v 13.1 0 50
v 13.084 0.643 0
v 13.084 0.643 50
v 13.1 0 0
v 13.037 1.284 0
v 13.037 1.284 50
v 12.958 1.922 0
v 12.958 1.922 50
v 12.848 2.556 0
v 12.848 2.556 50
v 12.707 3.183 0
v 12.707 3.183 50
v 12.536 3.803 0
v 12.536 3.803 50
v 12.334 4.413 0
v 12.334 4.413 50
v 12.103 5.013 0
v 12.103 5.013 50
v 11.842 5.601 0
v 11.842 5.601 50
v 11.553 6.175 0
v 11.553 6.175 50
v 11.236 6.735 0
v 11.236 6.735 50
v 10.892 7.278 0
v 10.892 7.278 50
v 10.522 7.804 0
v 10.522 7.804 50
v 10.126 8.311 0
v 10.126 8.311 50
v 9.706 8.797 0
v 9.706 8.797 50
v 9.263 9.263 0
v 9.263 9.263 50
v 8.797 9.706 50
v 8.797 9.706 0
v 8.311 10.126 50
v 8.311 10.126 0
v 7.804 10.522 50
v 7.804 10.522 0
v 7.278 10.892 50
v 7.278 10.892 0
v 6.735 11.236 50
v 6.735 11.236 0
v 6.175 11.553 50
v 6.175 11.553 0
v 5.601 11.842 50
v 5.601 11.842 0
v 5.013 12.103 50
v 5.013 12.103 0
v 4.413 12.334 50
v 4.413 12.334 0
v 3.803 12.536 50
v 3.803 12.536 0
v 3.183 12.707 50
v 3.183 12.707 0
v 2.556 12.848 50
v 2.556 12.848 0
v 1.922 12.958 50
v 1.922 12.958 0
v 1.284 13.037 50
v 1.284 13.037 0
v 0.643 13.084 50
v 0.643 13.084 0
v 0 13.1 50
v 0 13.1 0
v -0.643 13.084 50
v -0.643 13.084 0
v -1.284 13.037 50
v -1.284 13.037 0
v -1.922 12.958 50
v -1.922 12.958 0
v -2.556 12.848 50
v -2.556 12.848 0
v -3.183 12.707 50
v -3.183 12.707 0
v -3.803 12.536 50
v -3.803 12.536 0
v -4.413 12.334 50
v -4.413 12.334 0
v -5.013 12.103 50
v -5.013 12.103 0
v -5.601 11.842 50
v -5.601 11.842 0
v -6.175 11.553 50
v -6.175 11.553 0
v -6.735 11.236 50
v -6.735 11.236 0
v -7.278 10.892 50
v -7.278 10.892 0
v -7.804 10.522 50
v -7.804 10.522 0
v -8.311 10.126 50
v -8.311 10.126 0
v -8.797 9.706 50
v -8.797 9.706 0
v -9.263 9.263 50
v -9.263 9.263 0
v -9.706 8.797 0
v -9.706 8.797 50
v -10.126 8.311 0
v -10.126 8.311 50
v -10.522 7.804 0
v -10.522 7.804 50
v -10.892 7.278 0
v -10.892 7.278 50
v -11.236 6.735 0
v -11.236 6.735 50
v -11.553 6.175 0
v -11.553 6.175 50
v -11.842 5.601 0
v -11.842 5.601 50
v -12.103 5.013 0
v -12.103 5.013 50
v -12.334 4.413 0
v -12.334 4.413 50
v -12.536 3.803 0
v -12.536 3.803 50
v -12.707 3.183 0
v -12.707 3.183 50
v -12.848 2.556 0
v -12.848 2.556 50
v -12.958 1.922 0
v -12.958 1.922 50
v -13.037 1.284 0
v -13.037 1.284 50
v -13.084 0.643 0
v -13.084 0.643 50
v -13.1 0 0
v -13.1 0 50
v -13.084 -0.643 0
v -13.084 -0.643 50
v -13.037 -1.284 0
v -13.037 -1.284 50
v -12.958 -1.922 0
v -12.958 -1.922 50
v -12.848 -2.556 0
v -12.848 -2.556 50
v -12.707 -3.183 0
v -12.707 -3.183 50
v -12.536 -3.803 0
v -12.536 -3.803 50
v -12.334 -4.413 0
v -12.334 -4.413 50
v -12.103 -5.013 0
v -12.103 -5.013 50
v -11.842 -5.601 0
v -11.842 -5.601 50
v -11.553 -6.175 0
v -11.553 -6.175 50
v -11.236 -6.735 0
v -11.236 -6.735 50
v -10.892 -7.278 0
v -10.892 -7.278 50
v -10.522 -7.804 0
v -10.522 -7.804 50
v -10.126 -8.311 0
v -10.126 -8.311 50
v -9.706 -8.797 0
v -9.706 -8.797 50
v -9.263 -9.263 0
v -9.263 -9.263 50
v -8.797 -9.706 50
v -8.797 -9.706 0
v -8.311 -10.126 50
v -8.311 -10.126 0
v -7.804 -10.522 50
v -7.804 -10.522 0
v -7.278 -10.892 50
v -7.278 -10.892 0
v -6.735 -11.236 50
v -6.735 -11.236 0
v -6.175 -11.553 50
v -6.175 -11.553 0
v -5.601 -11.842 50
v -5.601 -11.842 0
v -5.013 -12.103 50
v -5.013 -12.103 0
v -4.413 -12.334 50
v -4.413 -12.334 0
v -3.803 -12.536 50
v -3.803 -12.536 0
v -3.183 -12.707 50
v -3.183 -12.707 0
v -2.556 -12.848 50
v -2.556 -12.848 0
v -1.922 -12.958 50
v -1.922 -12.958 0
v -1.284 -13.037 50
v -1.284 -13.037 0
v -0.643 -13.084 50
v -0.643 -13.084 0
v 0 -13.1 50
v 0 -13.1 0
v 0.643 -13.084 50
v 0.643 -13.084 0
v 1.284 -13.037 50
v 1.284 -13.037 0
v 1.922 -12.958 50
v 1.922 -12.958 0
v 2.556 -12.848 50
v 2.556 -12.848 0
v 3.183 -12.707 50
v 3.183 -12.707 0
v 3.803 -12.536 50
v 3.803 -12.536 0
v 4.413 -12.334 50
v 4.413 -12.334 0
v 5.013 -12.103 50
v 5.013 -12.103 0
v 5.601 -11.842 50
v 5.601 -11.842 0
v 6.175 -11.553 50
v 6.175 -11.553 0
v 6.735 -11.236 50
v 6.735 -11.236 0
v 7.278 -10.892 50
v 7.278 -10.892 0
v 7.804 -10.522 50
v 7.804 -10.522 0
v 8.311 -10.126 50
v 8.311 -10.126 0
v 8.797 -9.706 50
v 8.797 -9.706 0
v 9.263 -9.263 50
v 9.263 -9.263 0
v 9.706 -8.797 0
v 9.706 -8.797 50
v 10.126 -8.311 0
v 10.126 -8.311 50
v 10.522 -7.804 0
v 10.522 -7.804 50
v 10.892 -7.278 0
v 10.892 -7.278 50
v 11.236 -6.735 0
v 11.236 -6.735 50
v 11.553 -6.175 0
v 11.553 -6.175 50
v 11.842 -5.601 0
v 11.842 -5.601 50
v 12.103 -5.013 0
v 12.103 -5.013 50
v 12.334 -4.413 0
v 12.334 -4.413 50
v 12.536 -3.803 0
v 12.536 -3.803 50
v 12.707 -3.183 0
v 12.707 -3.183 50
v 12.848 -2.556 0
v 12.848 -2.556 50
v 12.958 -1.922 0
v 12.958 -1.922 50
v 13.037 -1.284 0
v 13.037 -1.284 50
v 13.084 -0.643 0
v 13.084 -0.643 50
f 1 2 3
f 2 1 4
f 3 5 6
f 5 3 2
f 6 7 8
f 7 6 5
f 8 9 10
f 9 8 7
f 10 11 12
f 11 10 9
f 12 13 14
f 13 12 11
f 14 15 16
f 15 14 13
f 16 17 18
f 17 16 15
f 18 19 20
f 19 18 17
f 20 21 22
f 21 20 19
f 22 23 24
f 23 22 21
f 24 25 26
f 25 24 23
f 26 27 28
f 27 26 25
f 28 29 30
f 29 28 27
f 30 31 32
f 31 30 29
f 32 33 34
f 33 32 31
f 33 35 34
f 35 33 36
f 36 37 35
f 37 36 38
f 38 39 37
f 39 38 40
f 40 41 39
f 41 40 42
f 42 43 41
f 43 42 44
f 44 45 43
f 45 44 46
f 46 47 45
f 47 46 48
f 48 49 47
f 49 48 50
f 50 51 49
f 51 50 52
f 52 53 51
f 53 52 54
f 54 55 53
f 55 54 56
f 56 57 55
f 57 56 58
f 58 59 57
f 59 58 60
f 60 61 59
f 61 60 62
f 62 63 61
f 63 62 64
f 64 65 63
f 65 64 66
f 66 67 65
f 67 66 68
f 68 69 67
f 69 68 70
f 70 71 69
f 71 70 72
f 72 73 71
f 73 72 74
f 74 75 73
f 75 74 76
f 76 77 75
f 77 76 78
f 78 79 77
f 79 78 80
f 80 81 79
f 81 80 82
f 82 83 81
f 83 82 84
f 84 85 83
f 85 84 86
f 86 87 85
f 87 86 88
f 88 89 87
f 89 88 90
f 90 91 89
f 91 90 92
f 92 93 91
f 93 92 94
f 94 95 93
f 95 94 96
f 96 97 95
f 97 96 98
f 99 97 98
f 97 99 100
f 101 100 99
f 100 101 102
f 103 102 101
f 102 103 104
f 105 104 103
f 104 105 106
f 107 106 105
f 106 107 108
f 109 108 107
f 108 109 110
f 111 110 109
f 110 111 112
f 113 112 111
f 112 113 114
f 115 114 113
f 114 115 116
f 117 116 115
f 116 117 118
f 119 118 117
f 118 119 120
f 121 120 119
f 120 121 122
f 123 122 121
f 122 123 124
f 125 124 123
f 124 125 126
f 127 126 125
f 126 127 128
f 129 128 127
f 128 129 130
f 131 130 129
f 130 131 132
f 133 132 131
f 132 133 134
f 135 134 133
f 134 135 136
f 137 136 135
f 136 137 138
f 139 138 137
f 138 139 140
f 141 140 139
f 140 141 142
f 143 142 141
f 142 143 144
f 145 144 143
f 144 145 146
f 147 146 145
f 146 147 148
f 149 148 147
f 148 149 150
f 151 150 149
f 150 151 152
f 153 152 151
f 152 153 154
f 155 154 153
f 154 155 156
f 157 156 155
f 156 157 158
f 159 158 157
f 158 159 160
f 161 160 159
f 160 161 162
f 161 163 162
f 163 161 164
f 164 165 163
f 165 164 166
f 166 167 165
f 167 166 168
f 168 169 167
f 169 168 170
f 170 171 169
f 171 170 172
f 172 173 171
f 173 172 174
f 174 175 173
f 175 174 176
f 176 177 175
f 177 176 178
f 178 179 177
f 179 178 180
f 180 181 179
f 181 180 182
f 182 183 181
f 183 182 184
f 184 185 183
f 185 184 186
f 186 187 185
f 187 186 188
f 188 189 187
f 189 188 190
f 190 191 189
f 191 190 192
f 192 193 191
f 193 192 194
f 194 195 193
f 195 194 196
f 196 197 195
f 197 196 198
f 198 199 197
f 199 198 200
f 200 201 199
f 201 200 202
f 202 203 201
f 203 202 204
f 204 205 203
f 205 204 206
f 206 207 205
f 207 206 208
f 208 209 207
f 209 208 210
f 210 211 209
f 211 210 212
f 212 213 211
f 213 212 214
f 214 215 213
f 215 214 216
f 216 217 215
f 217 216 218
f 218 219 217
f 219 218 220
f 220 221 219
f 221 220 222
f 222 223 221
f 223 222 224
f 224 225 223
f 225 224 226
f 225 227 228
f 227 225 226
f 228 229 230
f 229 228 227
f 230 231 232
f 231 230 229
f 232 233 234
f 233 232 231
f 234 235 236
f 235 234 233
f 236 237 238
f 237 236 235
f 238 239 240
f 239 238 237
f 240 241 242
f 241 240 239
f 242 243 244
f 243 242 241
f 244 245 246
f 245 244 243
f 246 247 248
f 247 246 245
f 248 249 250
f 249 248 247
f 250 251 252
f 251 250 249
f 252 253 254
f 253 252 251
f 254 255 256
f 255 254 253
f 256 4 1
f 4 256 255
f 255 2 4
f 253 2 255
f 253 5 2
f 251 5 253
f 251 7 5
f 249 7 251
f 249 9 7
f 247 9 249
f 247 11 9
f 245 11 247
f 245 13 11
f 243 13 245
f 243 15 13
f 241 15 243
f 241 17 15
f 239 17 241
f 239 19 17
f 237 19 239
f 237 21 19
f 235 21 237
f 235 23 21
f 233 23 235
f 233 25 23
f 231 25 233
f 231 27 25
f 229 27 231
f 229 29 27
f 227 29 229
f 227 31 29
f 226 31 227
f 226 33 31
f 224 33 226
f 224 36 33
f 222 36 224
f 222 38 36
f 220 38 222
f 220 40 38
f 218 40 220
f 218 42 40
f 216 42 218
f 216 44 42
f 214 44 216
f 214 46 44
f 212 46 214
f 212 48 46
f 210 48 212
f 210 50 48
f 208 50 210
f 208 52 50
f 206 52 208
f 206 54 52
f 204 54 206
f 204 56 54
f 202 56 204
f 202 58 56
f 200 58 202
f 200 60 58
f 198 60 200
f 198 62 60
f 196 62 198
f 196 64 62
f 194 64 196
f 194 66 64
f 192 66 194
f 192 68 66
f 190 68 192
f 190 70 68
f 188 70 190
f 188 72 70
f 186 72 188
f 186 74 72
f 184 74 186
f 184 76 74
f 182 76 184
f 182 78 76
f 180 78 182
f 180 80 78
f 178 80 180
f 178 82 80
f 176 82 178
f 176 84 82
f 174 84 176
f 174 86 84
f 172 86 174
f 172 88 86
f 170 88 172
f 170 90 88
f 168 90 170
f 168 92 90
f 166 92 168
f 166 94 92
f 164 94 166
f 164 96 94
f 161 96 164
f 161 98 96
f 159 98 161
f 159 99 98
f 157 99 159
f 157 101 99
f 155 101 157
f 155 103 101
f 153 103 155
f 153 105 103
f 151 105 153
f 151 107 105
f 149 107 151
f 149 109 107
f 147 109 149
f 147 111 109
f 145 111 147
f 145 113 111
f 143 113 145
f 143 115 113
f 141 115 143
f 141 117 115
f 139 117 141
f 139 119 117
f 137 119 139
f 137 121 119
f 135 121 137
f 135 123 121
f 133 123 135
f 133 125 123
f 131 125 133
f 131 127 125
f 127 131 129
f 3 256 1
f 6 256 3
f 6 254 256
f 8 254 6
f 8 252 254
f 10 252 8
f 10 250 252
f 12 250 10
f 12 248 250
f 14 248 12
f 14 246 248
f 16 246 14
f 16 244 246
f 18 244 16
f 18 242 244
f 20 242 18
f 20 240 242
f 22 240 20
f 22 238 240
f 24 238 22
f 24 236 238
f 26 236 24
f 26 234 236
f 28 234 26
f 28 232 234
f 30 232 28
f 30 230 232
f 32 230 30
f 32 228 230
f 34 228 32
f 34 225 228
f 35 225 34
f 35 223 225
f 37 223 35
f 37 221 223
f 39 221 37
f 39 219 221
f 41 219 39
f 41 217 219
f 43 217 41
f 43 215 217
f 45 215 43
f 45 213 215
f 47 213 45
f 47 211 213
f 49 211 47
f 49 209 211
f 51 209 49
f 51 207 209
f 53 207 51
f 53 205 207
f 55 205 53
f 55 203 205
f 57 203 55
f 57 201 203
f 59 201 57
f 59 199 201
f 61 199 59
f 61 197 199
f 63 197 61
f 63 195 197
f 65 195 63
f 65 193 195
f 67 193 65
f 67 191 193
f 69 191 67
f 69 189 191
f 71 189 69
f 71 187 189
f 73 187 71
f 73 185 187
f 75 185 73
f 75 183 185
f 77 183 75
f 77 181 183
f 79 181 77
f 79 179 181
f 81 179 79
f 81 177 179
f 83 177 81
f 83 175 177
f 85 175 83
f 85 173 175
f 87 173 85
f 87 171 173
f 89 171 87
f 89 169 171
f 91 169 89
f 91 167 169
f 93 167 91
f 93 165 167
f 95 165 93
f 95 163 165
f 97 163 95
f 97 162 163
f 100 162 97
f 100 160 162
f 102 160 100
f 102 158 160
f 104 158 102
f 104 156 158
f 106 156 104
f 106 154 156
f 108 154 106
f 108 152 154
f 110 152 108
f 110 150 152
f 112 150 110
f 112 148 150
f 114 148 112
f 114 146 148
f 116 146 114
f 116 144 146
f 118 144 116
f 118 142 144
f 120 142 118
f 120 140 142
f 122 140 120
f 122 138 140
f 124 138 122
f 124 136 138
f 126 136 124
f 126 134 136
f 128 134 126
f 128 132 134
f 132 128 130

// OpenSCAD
$fn = 128;

height = 50.0;
diameter = 26.2;

cylinder(h = height, d = diameter);
